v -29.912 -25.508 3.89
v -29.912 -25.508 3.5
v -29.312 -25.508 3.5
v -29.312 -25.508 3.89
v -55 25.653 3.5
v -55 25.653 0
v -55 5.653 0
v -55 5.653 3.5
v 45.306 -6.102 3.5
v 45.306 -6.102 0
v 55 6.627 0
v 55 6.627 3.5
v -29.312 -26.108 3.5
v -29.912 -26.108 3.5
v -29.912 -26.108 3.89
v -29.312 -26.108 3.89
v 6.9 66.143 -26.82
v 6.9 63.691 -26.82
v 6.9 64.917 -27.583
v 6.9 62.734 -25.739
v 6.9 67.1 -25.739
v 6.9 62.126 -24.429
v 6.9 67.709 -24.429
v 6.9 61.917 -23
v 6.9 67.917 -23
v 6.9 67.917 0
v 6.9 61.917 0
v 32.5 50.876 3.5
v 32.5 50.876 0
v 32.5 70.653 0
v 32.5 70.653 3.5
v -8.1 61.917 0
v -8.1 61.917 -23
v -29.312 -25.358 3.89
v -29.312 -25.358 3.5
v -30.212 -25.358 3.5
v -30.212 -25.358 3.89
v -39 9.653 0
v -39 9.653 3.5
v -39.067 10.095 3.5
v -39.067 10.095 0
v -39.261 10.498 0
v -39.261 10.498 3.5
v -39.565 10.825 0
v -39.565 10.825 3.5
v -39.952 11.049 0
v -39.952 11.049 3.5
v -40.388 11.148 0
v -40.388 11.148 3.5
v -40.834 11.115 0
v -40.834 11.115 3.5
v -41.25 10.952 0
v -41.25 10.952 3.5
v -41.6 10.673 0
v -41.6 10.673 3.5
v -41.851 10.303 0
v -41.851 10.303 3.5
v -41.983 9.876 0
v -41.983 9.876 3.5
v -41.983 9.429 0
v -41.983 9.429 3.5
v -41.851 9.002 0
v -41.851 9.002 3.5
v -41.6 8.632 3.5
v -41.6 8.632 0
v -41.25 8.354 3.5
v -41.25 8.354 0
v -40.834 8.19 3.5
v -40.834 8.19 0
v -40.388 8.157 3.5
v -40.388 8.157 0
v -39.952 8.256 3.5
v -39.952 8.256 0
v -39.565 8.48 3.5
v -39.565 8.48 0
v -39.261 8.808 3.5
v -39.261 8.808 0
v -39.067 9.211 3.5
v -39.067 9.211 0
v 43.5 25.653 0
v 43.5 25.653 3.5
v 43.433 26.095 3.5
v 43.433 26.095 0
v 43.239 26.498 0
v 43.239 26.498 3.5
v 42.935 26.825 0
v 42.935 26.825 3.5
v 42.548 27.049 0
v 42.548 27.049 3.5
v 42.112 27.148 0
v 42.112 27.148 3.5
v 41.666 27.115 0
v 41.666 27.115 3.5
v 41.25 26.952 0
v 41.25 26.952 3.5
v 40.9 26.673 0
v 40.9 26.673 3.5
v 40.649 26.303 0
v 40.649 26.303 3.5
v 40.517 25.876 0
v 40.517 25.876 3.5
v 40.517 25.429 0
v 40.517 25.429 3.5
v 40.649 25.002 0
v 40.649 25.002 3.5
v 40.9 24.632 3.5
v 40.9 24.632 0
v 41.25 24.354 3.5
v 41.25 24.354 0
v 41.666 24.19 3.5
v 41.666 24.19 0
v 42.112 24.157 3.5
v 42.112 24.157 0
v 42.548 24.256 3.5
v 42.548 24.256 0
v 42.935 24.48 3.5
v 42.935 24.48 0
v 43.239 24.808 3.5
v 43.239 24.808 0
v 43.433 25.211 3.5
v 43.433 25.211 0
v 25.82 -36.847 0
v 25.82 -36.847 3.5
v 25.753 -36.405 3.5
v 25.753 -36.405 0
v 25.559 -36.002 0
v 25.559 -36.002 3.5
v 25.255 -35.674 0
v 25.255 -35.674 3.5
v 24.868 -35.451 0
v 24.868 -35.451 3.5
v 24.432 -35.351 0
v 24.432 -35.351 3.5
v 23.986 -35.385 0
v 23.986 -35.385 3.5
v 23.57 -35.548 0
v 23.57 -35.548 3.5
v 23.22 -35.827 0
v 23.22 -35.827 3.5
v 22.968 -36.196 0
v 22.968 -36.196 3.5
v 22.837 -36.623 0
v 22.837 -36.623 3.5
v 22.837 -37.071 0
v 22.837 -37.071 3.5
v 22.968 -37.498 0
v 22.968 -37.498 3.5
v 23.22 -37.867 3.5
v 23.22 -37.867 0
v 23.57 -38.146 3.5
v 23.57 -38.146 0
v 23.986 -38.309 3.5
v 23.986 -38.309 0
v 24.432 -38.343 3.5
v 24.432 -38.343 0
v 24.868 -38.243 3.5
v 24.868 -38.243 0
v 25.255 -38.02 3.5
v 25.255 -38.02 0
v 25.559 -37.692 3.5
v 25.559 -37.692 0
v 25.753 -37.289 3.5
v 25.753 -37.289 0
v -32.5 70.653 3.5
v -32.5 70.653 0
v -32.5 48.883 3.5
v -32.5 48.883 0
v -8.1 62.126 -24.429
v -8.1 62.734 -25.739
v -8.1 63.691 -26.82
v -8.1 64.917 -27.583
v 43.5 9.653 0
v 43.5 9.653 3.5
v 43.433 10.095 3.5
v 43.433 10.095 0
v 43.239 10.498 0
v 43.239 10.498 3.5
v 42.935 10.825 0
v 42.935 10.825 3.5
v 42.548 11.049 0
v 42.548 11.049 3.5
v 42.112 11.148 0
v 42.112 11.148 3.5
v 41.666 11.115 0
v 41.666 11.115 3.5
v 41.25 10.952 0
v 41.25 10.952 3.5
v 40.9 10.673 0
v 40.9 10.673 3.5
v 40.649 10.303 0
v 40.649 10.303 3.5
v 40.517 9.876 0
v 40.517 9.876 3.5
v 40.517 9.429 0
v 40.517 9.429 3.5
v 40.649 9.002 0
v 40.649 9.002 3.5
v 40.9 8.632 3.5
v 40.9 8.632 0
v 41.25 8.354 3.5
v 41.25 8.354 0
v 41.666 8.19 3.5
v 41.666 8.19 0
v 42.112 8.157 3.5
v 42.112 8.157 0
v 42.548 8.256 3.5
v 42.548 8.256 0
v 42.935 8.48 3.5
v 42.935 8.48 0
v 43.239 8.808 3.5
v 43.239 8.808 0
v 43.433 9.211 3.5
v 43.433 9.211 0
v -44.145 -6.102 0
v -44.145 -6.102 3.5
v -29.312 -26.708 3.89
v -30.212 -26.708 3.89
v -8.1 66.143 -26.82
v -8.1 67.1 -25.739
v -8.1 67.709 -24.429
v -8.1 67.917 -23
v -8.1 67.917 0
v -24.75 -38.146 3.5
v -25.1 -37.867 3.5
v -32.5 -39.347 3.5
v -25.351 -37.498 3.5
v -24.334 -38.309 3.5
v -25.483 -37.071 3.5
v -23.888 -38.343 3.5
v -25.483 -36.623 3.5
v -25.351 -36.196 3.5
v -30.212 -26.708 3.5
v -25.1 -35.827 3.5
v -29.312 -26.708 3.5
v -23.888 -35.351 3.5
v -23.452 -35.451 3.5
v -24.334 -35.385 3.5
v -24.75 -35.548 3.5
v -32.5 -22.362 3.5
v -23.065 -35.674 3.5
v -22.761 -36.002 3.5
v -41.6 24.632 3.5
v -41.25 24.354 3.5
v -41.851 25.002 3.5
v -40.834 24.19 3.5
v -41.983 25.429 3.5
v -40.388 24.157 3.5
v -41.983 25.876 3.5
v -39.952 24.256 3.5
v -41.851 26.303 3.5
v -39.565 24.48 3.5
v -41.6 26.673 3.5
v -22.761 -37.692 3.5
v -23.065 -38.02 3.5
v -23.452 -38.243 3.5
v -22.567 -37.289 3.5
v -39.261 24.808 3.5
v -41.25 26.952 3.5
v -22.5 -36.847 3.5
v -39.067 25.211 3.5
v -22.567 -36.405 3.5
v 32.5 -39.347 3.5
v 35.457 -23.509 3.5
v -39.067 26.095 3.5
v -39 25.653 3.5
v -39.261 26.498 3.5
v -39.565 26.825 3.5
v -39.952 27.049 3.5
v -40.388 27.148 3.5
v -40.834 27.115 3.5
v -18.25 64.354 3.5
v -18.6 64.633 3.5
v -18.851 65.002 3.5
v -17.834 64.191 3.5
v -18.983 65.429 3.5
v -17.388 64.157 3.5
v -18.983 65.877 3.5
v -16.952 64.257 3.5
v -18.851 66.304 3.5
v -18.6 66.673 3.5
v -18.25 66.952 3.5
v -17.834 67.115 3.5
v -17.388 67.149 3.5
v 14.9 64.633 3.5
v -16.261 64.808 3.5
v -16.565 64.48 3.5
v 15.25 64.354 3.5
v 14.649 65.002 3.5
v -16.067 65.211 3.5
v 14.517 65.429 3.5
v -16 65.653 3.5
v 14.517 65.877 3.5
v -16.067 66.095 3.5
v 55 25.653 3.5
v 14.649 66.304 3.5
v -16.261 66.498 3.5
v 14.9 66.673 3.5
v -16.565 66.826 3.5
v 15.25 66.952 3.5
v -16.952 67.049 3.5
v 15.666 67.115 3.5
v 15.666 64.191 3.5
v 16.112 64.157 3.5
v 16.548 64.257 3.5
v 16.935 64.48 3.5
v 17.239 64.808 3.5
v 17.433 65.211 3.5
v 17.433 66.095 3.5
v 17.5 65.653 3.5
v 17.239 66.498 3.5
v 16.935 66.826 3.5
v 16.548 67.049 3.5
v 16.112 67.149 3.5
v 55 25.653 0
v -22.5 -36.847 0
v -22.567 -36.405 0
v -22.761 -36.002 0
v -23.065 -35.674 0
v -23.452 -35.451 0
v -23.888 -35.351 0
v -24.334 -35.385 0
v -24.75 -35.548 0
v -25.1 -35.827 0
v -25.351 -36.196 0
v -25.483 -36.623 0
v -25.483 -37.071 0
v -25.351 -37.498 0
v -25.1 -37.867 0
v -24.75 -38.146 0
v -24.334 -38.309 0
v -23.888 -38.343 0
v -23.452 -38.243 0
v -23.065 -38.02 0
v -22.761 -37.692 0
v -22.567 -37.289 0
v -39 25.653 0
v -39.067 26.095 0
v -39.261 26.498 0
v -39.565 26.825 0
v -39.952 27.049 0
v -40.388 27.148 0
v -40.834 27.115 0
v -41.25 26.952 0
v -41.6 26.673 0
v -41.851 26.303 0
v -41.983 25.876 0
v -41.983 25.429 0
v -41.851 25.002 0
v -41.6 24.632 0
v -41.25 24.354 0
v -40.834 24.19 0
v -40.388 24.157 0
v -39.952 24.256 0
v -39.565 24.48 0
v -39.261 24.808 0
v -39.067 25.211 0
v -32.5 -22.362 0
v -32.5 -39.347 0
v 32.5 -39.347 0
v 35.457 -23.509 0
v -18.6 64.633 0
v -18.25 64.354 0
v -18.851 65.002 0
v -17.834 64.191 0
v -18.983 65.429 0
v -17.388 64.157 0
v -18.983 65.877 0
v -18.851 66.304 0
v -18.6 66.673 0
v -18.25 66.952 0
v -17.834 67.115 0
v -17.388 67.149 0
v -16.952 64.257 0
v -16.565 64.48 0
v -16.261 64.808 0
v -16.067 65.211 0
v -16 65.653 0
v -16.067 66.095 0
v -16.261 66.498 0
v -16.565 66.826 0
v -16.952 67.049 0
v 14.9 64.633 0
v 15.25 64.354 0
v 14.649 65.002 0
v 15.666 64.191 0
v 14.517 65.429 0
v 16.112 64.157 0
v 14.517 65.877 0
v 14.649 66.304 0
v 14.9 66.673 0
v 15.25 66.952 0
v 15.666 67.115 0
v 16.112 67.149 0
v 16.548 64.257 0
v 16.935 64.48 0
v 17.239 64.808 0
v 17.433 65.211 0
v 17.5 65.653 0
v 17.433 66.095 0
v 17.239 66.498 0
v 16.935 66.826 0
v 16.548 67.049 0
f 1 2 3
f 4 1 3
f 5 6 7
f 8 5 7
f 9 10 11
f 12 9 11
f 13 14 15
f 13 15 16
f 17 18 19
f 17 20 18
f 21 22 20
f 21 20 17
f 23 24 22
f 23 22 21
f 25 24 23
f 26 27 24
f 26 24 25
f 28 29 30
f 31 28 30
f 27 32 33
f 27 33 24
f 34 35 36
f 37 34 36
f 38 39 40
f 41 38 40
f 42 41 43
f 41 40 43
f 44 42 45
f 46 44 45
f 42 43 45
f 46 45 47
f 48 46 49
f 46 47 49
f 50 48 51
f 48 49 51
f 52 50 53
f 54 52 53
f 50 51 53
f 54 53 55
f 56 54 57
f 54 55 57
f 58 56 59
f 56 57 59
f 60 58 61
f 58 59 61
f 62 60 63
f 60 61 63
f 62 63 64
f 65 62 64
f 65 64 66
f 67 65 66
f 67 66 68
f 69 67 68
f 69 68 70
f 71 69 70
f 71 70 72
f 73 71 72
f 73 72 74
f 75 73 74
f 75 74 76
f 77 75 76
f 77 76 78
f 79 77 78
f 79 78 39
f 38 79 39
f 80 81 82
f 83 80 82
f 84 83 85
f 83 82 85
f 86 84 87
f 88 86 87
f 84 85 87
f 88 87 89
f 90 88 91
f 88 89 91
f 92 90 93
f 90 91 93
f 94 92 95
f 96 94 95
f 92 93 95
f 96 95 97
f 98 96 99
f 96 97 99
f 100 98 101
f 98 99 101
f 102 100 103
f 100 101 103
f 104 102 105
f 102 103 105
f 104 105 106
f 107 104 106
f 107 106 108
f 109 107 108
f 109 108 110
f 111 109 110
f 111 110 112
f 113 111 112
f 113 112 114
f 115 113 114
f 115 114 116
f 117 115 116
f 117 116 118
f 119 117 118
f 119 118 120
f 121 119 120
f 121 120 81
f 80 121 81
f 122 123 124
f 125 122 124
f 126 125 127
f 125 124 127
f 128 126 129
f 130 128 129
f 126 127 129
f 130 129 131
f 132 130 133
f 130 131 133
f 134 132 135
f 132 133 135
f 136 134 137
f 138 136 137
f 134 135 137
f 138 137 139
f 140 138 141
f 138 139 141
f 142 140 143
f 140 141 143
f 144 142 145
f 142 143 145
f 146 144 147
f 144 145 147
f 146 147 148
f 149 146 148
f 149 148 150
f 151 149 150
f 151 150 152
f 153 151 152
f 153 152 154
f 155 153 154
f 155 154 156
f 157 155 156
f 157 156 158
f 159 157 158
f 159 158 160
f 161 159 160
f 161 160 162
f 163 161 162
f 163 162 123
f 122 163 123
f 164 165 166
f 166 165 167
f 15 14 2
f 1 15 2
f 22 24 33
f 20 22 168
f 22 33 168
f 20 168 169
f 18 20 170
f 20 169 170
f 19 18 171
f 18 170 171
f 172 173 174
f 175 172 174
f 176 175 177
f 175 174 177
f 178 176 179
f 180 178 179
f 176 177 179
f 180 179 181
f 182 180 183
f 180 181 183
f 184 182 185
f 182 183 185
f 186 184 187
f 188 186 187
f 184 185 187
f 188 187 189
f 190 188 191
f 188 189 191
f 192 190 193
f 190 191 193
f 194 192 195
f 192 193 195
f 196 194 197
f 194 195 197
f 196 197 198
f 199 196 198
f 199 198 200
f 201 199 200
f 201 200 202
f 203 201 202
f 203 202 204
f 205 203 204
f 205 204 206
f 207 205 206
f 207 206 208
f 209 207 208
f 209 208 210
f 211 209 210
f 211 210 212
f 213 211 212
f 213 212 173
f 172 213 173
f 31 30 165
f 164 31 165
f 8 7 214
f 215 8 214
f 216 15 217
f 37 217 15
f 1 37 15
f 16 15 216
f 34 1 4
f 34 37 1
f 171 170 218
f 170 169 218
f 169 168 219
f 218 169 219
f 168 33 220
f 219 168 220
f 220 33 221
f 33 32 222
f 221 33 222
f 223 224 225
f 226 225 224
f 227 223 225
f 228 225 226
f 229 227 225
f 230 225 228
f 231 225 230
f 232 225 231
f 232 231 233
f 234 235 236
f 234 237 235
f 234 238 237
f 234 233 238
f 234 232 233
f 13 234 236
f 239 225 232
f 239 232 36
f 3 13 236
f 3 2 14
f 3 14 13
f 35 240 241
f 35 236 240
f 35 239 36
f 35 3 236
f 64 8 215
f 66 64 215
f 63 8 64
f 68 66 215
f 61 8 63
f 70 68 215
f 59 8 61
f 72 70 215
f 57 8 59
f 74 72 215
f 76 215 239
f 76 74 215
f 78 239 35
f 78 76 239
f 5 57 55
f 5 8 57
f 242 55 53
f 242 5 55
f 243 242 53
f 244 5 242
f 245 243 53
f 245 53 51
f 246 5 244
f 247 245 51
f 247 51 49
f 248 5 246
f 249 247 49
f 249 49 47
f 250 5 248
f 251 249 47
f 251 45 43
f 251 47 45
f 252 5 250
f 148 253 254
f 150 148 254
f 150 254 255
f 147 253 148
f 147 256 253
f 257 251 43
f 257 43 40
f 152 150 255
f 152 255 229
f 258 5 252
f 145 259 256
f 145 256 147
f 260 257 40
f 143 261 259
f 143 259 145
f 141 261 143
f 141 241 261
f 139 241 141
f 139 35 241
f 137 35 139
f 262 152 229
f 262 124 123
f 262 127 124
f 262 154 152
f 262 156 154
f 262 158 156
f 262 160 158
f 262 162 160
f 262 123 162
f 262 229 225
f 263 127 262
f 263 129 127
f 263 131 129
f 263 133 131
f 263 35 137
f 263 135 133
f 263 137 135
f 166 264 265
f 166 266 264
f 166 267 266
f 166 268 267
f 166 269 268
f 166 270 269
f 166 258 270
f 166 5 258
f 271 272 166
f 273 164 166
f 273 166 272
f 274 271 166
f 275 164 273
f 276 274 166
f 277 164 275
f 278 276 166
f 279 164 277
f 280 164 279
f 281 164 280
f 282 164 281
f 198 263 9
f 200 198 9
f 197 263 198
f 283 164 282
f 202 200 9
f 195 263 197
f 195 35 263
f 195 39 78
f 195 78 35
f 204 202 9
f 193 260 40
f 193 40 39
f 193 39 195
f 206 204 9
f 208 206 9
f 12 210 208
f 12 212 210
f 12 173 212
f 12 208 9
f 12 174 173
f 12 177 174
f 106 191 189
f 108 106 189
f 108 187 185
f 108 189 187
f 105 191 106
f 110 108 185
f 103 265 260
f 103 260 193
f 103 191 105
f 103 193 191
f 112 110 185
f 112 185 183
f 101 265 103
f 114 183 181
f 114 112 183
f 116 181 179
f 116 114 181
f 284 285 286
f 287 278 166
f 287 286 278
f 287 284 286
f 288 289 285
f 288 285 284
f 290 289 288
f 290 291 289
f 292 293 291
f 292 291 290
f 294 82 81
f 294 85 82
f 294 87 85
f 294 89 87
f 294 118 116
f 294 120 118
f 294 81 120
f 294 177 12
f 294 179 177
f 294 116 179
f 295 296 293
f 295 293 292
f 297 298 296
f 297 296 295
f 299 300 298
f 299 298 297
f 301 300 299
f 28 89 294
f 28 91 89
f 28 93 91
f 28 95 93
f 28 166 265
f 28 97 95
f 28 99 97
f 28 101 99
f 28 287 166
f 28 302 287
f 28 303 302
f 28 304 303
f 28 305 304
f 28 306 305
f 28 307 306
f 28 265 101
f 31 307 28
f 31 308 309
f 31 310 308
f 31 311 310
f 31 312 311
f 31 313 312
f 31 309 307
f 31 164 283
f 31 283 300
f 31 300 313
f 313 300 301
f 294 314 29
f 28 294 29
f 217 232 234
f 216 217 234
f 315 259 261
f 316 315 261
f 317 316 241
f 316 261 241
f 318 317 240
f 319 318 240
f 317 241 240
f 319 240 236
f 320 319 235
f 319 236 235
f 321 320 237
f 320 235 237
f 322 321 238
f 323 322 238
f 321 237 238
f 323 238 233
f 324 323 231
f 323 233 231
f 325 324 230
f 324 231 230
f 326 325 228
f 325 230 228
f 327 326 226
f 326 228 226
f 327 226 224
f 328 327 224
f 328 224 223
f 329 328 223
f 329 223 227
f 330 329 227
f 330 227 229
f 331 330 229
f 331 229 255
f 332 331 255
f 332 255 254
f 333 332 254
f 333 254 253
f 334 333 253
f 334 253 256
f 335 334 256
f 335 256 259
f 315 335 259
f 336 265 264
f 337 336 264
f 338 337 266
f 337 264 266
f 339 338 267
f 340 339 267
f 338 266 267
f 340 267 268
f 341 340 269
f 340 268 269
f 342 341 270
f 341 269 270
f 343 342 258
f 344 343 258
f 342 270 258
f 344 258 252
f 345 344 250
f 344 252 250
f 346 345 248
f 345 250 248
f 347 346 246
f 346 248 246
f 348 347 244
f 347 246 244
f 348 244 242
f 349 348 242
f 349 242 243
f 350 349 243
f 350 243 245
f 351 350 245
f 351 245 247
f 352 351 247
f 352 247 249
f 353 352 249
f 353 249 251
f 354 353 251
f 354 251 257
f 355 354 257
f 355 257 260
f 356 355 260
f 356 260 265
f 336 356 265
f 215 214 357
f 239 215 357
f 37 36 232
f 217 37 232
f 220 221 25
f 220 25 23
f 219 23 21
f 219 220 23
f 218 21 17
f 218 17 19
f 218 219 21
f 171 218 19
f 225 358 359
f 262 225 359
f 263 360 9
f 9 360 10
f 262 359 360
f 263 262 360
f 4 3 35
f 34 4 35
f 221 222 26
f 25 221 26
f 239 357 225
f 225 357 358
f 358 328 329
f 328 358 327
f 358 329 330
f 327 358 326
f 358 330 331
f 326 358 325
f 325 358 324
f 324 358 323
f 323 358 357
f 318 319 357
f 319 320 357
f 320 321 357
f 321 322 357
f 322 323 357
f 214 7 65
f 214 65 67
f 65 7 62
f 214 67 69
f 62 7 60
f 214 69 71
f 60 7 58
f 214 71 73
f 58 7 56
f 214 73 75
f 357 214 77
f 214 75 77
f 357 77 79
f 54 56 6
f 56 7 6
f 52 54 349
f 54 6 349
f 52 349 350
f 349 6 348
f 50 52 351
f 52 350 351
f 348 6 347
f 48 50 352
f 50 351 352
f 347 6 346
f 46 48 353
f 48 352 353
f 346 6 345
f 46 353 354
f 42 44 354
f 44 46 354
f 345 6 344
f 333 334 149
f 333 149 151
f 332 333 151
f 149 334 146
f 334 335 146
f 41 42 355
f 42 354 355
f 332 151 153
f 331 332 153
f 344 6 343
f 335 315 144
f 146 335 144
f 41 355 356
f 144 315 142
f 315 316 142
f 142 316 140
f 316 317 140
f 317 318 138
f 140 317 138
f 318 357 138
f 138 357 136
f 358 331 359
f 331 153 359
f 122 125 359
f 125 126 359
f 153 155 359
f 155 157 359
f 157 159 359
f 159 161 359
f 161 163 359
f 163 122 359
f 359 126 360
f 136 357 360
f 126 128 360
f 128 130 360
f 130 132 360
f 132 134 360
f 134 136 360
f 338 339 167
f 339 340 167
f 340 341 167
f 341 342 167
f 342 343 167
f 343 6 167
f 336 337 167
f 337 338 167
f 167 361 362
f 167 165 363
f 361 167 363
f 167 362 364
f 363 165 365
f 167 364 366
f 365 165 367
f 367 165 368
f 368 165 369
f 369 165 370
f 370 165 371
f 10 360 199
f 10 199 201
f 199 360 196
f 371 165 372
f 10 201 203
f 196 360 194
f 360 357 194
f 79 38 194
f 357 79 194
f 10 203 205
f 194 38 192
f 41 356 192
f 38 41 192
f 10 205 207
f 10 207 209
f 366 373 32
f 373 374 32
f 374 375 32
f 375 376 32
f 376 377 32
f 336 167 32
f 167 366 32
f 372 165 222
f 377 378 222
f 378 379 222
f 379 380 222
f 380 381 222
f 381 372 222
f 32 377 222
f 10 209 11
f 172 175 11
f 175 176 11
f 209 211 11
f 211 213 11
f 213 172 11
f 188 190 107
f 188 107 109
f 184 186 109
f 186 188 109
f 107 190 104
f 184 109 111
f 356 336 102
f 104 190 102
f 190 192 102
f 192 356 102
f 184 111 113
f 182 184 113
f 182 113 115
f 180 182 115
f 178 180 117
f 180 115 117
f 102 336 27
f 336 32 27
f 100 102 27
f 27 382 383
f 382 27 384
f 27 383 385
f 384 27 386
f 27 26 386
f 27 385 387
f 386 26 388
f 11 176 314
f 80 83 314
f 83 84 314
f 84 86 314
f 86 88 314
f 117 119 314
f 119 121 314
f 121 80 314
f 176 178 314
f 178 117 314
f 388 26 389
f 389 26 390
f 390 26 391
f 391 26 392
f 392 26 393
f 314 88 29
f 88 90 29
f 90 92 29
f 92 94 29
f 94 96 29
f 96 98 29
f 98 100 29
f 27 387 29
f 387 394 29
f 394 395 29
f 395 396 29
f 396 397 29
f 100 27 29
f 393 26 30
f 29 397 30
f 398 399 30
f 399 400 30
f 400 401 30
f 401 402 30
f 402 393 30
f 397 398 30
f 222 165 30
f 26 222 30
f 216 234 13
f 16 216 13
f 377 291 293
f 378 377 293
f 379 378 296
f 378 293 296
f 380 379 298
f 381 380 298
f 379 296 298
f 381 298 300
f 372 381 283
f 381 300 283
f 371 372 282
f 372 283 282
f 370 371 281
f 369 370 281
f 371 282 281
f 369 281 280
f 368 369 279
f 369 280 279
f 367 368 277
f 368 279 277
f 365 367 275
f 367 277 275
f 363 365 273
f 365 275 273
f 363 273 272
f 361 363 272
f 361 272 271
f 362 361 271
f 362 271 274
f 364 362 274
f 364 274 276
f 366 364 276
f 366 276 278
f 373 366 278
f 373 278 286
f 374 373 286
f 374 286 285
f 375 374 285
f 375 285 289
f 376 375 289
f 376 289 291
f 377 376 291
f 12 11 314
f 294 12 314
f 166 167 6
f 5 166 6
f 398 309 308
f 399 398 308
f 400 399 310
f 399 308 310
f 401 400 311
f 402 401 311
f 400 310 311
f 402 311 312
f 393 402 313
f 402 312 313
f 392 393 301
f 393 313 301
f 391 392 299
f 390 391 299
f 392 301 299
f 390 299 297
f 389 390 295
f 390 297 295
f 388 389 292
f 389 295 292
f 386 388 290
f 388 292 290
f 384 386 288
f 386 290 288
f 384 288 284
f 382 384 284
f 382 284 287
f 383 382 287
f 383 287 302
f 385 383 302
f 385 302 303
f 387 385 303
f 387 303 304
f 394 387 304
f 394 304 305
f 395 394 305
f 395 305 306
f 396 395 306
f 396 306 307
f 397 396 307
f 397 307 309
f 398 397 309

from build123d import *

# Parameters (mm, degrees)
F2_DEPTH    = 3.5
F3_R        = 1.5
F4_DEPTH    = 25
F5_W        = 15
F5_H        = 6
F6_DEPTH    = 28
F7_T1_DEPTH = 40
F8_W        = 0.6
F8_H        = 0.6
F9_DEPTH    = 0.39


# Not quite as in the source:
# - a fillet or chamfer that OpenCascade refuses, or shapes differently, is made with other operations: its cross-section is extruded or revolved along the edge and cut away or added


with BuildPart() as f2:
    # F0 (on Top) → F2 (new body)
    with BuildSketch(Plane.XY):
        Polygon((32.5, 70.6530249731), (-32.5, 70.6530249731), (-32.5, 59.4207410195), (-32.5, 48.8827627578), (-55, 25.6526721455), (-55, 5.6526721455), (-44.1446197954, -6.101506712), (-32.5, -22.3619750269), (-32.5, -39.3469750269), (32.5, -39.3469750269), (35.4572725267, -23.5087187488), (45.3055703038, -6.101506712), (55, 6.6271237275), (55, 25.6530249731), (32.5, 50.8760847151), align=None)
    extrude(amount=F2_DEPTH)

    # F3 (on face) → F4 (cut)
    with BuildSketch(Plane.XY.offset(3.5)):
        with Locations((-17.5, 65.6530249731)):
            Circle(F3_R)
        with Locations((16, 65.6530249731)):
            Circle(F3_R)
        with Locations((-40.5, 25.6526721455)):
            Circle(F3_R)
        with Locations((-40.5, 9.6526721455)):
            Circle(F3_R)
        with Locations((42, 25.6526721455)):
            Circle(F3_R)
        with Locations((42, 9.6526721455)):
            Circle(F3_R)
        with Locations((24.3198931655, -36.8469750269)):
            Circle(F3_R)
        with Locations((-24, -36.8469750269)):
            Circle(F3_R)
    extrude(amount=-F4_DEPTH, mode=Mode.SUBTRACT)

    # F5 (on face) → F6 (join)
    with BuildSketch(Plane.XY):
        with Locations((-0.6, 64.9171224535)):
            Rectangle(F5_W, F5_H)
    extrude(amount=-F6_DEPTH)

    # F7: fillet of radius 5 on 2 edges, made by hand

    # F7_s2 → F7_t1 (cut)
    with BuildSketch(Plane.YZ.offset(-20.6)):
        with BuildLine():
            ThreePointArc((61.9171224535, -23), (63.3815885475, -26.5355339059), (66.9171224535, -28))
            Line((66.9171224535, -28), (61.9171224535, -28))
            Line((61.9171224535, -28), (61.9171224535, -23))
        make_face()
        with BuildLine():
            ThreePointArc((67.9171224535, -23), (66.4526563594, -26.5355339059), (62.9171224535, -28))
            Line((62.9171224535, -28), (67.9171224535, -28))
            Line((67.9171224535, -28), (67.9171224535, -23))
        make_face()
    extrude(amount=F7_T1_DEPTH, mode=Mode.SUBTRACT)

    # F8 (on face) → F9 (join)
    with BuildSketch(Plane.XY.offset(3.5)):
        Polygon((-30.2116373062, -25.3581409693), (-30.2116373062, -25.5081409693), (-30.0116373062, -25.5081409693), (-29.9116373062, -25.5081409693), (-29.3116373062, -25.5081409693), (-29.3116373062, -25.3581409693), align=None)
        Polygon((-30.0116373062, -25.5081409693), (-30.2116373062, -25.5081409693), (-30.2116373062, -26.7081409693), (-29.9116373062, -26.7081409693), (-29.9116373062, -26.1081409693), (-29.9116373062, -25.5081409693), align=None)
        with Locations((-29.6116373062, -26.4081409693)):
            Rectangle(F8_W, F8_H)
    extrude(amount=F9_DEPTH)


solid = f2.part
